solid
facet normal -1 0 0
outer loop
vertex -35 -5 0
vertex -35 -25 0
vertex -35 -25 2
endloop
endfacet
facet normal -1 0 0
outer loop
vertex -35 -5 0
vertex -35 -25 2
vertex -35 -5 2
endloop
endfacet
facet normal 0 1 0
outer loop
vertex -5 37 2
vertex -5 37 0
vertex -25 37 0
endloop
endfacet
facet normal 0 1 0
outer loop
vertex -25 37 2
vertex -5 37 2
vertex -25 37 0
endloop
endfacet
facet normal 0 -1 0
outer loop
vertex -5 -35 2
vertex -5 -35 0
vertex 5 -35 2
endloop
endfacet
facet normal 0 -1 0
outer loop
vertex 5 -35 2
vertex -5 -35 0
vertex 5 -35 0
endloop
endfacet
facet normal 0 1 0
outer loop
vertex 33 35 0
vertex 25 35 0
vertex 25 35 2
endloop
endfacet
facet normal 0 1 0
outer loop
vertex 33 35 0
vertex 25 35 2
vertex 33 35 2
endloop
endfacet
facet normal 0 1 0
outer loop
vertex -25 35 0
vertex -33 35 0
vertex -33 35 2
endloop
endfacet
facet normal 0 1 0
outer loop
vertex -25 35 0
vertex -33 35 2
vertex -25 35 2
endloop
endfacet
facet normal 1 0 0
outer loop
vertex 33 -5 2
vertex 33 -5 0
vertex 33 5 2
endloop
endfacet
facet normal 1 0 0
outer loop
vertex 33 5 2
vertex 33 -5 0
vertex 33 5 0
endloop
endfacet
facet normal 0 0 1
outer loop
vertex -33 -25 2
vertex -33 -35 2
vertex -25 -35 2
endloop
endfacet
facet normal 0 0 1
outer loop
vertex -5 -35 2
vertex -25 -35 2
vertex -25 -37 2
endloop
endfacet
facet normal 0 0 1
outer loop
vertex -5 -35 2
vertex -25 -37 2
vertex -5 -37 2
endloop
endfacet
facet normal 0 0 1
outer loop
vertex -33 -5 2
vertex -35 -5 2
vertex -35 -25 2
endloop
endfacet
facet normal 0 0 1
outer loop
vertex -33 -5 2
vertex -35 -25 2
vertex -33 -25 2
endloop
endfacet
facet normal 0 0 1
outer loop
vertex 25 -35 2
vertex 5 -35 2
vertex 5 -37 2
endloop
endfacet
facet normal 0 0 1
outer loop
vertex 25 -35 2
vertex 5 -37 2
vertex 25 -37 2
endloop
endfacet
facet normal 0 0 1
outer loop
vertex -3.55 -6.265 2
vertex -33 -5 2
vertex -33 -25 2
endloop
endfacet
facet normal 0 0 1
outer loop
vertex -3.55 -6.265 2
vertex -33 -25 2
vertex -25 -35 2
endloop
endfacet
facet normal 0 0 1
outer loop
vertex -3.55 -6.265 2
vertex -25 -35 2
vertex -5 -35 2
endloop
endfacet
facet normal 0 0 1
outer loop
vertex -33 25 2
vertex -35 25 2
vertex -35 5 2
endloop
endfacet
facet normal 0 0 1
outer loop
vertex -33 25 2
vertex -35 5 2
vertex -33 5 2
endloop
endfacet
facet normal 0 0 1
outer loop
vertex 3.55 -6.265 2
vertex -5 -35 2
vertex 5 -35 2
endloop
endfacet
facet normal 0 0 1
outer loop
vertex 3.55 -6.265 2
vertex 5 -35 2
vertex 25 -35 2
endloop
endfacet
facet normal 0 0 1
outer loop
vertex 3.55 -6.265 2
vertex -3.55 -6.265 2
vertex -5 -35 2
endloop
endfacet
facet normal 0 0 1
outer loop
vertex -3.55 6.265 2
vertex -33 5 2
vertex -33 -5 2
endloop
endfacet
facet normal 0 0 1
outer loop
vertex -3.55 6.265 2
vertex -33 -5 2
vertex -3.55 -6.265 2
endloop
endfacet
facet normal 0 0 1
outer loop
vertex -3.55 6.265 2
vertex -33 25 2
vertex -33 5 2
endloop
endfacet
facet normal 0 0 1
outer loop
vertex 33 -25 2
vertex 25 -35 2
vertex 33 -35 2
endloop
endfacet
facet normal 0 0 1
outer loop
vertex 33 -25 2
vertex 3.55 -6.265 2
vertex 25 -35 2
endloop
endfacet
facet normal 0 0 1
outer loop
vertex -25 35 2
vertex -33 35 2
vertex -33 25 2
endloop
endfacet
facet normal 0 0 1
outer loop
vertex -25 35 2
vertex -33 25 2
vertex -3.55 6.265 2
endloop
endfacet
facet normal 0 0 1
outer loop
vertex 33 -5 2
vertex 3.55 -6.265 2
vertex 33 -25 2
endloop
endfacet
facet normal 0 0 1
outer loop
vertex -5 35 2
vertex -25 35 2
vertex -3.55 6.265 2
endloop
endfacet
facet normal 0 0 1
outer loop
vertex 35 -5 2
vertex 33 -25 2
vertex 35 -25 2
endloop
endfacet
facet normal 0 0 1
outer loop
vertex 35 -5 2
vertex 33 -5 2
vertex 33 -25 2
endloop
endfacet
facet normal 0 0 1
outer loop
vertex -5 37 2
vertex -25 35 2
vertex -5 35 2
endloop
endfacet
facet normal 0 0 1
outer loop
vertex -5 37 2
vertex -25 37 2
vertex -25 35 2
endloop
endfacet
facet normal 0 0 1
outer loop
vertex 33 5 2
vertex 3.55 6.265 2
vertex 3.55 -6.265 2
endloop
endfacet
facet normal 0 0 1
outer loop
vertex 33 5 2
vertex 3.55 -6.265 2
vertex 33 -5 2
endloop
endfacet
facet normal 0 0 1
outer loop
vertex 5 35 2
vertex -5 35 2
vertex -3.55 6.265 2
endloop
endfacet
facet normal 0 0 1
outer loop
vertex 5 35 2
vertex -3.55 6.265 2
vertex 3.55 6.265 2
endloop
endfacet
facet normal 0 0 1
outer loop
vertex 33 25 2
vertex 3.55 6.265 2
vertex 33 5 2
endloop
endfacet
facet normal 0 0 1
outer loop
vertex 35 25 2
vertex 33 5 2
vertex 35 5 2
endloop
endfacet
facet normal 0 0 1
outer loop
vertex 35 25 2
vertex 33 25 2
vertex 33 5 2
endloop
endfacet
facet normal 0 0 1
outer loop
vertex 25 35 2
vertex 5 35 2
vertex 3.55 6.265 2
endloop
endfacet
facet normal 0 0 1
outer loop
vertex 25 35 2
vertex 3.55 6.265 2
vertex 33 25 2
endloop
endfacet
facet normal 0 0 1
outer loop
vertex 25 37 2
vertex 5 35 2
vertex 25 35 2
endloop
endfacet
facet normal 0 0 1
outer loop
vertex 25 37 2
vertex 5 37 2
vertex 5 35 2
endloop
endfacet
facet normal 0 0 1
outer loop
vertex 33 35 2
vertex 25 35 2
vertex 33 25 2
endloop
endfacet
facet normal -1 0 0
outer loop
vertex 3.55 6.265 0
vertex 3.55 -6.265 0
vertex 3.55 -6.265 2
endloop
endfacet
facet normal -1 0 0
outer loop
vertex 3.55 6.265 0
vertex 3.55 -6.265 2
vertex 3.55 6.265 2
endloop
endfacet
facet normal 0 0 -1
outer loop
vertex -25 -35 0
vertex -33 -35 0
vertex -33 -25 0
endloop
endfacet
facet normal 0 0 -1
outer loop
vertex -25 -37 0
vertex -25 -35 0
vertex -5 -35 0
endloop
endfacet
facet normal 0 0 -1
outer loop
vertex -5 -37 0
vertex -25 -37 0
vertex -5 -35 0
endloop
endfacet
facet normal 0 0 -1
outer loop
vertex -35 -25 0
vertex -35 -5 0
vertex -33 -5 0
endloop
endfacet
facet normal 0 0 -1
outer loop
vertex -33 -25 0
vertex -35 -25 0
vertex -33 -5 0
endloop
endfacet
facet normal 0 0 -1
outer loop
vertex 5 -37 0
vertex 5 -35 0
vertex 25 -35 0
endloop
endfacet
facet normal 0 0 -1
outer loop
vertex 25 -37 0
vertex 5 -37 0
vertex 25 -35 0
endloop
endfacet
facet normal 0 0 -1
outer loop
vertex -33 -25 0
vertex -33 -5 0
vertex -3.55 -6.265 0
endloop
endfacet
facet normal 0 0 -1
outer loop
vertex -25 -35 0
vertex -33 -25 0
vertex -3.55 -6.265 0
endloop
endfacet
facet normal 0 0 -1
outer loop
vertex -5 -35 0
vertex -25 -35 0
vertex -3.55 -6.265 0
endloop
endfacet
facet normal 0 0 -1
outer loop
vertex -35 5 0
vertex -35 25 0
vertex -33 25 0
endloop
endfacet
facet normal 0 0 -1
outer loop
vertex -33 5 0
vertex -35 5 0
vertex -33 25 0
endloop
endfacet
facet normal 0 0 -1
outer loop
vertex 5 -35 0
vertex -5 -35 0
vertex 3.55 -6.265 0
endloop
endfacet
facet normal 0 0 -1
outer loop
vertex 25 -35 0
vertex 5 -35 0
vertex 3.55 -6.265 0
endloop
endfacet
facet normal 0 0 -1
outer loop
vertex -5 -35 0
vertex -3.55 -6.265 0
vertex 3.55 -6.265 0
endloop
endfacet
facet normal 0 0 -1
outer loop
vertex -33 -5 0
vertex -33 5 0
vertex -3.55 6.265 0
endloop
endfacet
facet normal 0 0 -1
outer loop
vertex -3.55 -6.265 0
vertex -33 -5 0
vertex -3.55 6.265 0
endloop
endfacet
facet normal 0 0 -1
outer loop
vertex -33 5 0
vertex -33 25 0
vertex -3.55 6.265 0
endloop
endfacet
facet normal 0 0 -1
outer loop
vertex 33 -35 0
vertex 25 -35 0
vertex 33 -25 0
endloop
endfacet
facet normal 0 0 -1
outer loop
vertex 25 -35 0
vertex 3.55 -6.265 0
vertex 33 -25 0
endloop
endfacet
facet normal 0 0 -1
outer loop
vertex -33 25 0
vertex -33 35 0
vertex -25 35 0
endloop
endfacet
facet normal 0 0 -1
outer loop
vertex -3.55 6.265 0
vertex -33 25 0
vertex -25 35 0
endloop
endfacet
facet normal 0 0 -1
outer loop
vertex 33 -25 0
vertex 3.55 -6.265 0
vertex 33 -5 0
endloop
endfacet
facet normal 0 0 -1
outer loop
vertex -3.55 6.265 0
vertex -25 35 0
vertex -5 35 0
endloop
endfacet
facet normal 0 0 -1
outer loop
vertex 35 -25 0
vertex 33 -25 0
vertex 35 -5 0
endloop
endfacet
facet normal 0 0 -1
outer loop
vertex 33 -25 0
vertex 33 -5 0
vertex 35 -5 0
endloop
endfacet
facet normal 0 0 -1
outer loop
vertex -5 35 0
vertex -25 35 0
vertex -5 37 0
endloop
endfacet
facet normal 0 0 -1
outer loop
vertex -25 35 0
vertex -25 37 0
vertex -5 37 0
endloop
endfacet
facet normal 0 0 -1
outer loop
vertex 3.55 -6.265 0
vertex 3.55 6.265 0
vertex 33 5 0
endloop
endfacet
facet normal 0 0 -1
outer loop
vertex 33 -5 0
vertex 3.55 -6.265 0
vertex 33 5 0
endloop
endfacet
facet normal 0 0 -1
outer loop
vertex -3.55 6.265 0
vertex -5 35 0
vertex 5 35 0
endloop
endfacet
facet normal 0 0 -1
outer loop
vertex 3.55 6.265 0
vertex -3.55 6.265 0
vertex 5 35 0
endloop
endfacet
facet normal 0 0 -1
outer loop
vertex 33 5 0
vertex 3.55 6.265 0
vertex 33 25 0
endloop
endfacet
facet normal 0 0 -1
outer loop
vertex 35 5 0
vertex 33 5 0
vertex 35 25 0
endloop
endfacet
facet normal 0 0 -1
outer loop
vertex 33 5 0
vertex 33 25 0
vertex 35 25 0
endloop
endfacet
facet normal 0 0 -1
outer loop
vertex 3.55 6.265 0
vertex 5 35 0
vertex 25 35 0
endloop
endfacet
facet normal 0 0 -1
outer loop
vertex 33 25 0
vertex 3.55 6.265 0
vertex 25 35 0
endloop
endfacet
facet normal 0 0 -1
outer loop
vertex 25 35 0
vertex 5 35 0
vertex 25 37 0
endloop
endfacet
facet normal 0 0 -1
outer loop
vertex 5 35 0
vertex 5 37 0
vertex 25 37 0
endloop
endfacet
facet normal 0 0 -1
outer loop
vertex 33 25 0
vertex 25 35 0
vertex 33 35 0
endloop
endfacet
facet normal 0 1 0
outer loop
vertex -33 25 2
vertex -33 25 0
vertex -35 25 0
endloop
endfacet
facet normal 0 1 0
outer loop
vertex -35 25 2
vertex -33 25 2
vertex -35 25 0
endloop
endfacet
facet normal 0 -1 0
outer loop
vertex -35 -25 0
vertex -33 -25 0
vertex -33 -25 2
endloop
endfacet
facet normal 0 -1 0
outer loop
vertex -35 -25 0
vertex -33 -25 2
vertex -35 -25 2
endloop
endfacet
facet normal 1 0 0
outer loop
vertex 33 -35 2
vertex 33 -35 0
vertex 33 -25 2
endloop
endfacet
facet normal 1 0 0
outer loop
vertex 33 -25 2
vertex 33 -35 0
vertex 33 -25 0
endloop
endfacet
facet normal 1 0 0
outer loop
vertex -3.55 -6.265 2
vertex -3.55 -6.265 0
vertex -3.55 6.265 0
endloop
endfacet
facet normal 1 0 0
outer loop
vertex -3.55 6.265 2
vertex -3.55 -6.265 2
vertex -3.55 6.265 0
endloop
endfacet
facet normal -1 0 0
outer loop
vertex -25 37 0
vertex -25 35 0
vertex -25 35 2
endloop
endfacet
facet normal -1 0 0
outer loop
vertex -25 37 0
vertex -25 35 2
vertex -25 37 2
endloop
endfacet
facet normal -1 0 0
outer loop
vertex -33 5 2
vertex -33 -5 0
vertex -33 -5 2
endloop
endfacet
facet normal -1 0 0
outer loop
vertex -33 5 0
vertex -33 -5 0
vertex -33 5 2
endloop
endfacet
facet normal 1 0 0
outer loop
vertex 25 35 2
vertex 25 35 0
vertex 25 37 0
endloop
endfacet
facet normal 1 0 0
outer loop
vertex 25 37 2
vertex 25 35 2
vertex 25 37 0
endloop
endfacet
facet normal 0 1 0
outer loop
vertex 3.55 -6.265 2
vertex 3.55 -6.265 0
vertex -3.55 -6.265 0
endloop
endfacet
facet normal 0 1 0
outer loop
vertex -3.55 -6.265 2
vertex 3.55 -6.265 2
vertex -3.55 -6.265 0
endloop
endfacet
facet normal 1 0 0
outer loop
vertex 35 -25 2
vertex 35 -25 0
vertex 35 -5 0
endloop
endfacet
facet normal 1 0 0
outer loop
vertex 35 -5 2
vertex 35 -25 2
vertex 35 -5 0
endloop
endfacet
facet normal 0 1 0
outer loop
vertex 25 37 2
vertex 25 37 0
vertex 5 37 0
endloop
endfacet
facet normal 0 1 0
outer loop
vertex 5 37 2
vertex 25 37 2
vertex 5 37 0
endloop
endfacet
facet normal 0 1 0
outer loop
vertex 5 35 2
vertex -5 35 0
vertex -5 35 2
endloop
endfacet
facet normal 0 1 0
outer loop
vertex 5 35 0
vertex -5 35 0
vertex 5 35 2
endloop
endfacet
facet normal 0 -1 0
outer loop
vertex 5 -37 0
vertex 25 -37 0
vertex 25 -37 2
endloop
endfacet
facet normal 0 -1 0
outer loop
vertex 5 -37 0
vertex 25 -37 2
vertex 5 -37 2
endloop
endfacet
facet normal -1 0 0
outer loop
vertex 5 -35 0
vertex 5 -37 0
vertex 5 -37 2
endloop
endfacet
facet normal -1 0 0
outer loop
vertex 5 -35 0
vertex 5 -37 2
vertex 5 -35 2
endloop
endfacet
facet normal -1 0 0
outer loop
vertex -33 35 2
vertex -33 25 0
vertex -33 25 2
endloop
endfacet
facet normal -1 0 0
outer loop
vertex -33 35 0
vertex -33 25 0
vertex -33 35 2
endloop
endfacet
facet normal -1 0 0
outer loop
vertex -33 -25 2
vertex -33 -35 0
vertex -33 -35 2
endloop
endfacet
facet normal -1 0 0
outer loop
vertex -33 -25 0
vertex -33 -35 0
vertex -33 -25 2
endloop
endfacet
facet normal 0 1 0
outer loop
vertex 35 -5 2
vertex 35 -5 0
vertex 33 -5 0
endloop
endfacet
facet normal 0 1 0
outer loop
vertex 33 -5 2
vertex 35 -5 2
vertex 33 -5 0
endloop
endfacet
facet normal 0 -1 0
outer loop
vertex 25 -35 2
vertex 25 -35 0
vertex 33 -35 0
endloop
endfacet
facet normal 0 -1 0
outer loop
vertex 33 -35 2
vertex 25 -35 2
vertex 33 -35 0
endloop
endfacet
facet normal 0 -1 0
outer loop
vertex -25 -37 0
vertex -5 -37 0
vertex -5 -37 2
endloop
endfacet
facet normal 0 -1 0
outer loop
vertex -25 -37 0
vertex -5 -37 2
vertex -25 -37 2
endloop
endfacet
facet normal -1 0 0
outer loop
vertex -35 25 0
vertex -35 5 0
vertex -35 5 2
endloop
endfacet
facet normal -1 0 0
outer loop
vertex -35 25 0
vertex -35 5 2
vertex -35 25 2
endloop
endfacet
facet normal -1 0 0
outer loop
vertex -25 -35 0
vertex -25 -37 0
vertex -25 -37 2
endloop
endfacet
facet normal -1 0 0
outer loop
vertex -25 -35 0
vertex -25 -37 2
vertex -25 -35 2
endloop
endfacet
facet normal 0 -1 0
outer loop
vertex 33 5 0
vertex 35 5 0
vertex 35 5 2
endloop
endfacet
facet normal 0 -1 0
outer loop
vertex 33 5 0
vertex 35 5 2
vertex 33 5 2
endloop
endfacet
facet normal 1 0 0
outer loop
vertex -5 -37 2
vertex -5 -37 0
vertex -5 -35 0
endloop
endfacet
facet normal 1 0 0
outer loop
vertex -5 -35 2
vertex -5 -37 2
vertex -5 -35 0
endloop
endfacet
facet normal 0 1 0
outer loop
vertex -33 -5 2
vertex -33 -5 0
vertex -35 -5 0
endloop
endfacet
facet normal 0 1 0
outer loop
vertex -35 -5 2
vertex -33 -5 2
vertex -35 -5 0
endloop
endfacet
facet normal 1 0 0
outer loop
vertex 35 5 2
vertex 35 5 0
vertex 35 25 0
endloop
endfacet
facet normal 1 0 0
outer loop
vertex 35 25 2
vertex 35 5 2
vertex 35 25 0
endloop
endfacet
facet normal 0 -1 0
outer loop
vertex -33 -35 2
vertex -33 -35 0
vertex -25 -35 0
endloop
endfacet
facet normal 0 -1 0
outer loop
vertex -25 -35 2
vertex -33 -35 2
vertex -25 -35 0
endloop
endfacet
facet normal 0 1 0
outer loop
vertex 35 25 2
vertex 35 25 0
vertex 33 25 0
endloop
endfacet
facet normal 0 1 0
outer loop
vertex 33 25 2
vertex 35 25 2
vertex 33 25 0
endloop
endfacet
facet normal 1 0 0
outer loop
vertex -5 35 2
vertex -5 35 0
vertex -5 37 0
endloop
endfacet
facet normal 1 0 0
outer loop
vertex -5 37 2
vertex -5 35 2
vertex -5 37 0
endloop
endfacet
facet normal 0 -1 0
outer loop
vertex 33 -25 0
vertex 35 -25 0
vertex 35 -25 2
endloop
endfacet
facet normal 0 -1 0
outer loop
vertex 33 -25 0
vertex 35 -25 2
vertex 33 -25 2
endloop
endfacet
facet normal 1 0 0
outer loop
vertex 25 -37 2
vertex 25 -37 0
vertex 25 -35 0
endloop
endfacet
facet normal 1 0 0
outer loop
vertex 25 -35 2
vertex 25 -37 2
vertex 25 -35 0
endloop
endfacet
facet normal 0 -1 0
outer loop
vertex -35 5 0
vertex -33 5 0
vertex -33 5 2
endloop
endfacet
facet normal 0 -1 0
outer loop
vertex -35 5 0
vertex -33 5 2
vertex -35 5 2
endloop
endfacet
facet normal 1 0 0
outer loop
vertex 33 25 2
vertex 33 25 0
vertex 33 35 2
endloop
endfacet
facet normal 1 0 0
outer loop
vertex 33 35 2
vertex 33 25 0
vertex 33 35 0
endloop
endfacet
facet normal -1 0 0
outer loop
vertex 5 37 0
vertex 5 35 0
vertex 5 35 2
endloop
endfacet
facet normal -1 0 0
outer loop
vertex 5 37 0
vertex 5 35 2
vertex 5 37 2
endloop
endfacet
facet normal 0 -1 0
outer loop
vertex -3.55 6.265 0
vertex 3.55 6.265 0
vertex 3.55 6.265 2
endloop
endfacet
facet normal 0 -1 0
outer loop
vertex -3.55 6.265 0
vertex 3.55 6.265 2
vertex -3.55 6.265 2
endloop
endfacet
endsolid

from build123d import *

# Parameters (mm, degrees)
SKETCH1_W           = 66
SKETCH1_H           = 70
BOSS_EXTRUDE1_DEPTH = 2
SKETCH2_W           = 2
SKETCH2_H           = 20
BOSS_EXTRUDE2_DEPTH = 2
SKETCH3_W           = 20
SKETCH3_H           = 2
BOSS_EXTRUDE3_DEPTH = 2
SKETCH4_W           = 7.1
SKETCH4_H           = 12.53
CUT_EXTRUDE1_DEPTH  = 10


with BuildPart() as part:
    # Sketch1 → Boss-Extrude1 (new body)
    with BuildSketch(Plane.XY):
        Rectangle(SKETCH1_W, SKETCH1_H)
    extrude(amount=BOSS_EXTRUDE1_DEPTH)

    # Sketch2 → Boss-Extrude2 (add)
    with BuildSketch(Plane(origin=(0, 0, 0), x_dir=(-1, 0, 0), z_dir=(0, 0, -1))):
        with Locations((34, -15)):
            Rectangle(SKETCH2_W, SKETCH2_H)
        with Locations((34, 15)):
            Rectangle(SKETCH2_W, SKETCH2_H)
        with Locations((-34, -15)):
            Rectangle(SKETCH2_W, SKETCH2_H)
        with Locations((-34, 15)):
            Rectangle(SKETCH2_W, SKETCH2_H)
    extrude(amount=-BOSS_EXTRUDE2_DEPTH)

    # Sketch3 → Boss-Extrude3 (add)
    with BuildSketch(Plane(origin=(0, 0, 0), x_dir=(-1, 0, 0), z_dir=(0, 0, -1))):
        with Locations((-15, 36)):
            Rectangle(SKETCH3_W, SKETCH3_H)
        with Locations((15, 36)):
            Rectangle(SKETCH3_W, SKETCH3_H)
        with Locations((-15, -36)):
            Rectangle(SKETCH3_W, SKETCH3_H)
        with Locations((15, -36)):
            Rectangle(SKETCH3_W, SKETCH3_H)
    extrude(amount=-BOSS_EXTRUDE3_DEPTH)

    # Sketch4 → Cut-Extrude1 (cut)
    with BuildSketch(Plane(origin=(0, 0, 0), x_dir=(-1, 0, 0), z_dir=(0, 0, -1))):
        Rectangle(SKETCH4_W, SKETCH4_H)
    extrude(amount=-CUT_EXTRUDE1_DEPTH, mode=Mode.SUBTRACT)


solid = part.part
